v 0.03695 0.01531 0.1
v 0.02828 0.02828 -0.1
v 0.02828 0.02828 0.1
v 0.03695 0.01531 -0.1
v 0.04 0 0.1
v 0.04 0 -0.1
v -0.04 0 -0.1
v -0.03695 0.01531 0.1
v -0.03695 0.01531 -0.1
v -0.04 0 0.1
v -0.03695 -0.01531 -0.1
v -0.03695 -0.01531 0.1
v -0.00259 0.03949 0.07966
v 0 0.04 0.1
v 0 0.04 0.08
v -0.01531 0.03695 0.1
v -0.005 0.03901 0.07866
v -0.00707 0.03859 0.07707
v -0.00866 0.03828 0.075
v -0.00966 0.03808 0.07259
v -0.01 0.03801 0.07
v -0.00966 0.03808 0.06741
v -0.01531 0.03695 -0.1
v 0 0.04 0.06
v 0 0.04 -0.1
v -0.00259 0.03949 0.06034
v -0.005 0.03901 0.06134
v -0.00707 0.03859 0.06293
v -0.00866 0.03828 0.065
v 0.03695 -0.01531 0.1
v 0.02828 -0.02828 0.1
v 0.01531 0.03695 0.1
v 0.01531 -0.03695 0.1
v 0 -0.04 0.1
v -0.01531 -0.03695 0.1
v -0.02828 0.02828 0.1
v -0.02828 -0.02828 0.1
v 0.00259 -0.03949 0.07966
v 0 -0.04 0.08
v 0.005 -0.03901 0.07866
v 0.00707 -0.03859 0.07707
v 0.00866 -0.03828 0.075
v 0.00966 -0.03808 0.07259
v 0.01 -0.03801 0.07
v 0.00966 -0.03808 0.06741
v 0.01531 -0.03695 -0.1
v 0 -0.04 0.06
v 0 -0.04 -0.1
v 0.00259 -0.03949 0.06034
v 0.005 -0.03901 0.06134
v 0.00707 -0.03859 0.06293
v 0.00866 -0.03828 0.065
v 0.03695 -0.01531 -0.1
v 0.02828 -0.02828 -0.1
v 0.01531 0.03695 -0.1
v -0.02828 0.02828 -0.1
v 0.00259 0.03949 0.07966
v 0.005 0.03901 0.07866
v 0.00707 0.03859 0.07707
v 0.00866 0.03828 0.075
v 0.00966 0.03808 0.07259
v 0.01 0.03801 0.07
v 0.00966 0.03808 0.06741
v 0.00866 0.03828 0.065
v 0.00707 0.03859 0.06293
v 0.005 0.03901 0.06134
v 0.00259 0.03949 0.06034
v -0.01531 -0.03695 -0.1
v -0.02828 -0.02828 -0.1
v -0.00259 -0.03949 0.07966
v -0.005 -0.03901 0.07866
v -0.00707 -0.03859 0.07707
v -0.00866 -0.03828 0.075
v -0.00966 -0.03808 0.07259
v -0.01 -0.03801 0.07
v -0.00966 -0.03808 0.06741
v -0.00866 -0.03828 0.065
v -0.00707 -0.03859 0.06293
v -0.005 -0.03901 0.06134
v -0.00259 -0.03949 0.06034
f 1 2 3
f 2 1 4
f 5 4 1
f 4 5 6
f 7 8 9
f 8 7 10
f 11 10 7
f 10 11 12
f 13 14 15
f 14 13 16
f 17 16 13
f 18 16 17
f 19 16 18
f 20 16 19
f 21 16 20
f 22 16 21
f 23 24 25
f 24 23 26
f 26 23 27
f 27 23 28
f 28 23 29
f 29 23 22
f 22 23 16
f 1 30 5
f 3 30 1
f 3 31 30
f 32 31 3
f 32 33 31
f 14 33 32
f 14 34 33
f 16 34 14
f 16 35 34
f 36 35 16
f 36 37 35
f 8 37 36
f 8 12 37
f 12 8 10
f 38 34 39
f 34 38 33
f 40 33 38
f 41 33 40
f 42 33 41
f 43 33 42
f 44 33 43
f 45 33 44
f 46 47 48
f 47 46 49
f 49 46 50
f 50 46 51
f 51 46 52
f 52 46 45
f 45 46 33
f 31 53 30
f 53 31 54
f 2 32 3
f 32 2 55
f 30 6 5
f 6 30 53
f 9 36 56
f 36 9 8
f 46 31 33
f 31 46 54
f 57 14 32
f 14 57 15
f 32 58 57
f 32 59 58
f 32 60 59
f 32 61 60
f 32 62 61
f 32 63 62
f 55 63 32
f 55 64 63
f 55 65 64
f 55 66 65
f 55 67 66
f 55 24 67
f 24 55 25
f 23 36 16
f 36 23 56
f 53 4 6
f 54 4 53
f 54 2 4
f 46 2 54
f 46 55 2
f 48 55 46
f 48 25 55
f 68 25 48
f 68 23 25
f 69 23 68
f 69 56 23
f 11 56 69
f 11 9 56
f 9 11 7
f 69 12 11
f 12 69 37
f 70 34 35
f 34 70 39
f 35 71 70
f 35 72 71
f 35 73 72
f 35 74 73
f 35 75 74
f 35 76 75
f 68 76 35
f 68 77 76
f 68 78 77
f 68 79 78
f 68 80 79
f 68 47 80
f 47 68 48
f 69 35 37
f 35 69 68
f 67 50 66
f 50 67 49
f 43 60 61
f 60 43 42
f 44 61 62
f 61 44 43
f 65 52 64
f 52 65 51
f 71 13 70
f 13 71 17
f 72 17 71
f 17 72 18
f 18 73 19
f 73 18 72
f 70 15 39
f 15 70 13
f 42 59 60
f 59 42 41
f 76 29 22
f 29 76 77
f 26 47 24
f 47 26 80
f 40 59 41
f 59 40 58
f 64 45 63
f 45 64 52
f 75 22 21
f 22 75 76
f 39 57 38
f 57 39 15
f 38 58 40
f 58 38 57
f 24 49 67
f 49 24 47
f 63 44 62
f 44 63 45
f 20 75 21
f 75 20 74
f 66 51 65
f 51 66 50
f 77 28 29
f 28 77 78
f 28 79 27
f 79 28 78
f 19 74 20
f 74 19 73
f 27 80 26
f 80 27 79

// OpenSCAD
$fn=16;

rod_d = 0.08;
rod_h = 0.20;

hole_d = 0.02;
hole_offset_from_end = 0.03;

module rod_body(d, h){
    cylinder(d=d, h=h, center=true);
}

module cross_hole(d, len){
    rotate([90,0,0]) cylinder(d=d, h=len, center=true, $fn=24);
}

difference(){
    rod_body(rod_d, rod_h);
    translate([0,0, rod_h/2 - hole_offset_from_end])
        cross_hole(hole_d, rod_d*1.6);
}
